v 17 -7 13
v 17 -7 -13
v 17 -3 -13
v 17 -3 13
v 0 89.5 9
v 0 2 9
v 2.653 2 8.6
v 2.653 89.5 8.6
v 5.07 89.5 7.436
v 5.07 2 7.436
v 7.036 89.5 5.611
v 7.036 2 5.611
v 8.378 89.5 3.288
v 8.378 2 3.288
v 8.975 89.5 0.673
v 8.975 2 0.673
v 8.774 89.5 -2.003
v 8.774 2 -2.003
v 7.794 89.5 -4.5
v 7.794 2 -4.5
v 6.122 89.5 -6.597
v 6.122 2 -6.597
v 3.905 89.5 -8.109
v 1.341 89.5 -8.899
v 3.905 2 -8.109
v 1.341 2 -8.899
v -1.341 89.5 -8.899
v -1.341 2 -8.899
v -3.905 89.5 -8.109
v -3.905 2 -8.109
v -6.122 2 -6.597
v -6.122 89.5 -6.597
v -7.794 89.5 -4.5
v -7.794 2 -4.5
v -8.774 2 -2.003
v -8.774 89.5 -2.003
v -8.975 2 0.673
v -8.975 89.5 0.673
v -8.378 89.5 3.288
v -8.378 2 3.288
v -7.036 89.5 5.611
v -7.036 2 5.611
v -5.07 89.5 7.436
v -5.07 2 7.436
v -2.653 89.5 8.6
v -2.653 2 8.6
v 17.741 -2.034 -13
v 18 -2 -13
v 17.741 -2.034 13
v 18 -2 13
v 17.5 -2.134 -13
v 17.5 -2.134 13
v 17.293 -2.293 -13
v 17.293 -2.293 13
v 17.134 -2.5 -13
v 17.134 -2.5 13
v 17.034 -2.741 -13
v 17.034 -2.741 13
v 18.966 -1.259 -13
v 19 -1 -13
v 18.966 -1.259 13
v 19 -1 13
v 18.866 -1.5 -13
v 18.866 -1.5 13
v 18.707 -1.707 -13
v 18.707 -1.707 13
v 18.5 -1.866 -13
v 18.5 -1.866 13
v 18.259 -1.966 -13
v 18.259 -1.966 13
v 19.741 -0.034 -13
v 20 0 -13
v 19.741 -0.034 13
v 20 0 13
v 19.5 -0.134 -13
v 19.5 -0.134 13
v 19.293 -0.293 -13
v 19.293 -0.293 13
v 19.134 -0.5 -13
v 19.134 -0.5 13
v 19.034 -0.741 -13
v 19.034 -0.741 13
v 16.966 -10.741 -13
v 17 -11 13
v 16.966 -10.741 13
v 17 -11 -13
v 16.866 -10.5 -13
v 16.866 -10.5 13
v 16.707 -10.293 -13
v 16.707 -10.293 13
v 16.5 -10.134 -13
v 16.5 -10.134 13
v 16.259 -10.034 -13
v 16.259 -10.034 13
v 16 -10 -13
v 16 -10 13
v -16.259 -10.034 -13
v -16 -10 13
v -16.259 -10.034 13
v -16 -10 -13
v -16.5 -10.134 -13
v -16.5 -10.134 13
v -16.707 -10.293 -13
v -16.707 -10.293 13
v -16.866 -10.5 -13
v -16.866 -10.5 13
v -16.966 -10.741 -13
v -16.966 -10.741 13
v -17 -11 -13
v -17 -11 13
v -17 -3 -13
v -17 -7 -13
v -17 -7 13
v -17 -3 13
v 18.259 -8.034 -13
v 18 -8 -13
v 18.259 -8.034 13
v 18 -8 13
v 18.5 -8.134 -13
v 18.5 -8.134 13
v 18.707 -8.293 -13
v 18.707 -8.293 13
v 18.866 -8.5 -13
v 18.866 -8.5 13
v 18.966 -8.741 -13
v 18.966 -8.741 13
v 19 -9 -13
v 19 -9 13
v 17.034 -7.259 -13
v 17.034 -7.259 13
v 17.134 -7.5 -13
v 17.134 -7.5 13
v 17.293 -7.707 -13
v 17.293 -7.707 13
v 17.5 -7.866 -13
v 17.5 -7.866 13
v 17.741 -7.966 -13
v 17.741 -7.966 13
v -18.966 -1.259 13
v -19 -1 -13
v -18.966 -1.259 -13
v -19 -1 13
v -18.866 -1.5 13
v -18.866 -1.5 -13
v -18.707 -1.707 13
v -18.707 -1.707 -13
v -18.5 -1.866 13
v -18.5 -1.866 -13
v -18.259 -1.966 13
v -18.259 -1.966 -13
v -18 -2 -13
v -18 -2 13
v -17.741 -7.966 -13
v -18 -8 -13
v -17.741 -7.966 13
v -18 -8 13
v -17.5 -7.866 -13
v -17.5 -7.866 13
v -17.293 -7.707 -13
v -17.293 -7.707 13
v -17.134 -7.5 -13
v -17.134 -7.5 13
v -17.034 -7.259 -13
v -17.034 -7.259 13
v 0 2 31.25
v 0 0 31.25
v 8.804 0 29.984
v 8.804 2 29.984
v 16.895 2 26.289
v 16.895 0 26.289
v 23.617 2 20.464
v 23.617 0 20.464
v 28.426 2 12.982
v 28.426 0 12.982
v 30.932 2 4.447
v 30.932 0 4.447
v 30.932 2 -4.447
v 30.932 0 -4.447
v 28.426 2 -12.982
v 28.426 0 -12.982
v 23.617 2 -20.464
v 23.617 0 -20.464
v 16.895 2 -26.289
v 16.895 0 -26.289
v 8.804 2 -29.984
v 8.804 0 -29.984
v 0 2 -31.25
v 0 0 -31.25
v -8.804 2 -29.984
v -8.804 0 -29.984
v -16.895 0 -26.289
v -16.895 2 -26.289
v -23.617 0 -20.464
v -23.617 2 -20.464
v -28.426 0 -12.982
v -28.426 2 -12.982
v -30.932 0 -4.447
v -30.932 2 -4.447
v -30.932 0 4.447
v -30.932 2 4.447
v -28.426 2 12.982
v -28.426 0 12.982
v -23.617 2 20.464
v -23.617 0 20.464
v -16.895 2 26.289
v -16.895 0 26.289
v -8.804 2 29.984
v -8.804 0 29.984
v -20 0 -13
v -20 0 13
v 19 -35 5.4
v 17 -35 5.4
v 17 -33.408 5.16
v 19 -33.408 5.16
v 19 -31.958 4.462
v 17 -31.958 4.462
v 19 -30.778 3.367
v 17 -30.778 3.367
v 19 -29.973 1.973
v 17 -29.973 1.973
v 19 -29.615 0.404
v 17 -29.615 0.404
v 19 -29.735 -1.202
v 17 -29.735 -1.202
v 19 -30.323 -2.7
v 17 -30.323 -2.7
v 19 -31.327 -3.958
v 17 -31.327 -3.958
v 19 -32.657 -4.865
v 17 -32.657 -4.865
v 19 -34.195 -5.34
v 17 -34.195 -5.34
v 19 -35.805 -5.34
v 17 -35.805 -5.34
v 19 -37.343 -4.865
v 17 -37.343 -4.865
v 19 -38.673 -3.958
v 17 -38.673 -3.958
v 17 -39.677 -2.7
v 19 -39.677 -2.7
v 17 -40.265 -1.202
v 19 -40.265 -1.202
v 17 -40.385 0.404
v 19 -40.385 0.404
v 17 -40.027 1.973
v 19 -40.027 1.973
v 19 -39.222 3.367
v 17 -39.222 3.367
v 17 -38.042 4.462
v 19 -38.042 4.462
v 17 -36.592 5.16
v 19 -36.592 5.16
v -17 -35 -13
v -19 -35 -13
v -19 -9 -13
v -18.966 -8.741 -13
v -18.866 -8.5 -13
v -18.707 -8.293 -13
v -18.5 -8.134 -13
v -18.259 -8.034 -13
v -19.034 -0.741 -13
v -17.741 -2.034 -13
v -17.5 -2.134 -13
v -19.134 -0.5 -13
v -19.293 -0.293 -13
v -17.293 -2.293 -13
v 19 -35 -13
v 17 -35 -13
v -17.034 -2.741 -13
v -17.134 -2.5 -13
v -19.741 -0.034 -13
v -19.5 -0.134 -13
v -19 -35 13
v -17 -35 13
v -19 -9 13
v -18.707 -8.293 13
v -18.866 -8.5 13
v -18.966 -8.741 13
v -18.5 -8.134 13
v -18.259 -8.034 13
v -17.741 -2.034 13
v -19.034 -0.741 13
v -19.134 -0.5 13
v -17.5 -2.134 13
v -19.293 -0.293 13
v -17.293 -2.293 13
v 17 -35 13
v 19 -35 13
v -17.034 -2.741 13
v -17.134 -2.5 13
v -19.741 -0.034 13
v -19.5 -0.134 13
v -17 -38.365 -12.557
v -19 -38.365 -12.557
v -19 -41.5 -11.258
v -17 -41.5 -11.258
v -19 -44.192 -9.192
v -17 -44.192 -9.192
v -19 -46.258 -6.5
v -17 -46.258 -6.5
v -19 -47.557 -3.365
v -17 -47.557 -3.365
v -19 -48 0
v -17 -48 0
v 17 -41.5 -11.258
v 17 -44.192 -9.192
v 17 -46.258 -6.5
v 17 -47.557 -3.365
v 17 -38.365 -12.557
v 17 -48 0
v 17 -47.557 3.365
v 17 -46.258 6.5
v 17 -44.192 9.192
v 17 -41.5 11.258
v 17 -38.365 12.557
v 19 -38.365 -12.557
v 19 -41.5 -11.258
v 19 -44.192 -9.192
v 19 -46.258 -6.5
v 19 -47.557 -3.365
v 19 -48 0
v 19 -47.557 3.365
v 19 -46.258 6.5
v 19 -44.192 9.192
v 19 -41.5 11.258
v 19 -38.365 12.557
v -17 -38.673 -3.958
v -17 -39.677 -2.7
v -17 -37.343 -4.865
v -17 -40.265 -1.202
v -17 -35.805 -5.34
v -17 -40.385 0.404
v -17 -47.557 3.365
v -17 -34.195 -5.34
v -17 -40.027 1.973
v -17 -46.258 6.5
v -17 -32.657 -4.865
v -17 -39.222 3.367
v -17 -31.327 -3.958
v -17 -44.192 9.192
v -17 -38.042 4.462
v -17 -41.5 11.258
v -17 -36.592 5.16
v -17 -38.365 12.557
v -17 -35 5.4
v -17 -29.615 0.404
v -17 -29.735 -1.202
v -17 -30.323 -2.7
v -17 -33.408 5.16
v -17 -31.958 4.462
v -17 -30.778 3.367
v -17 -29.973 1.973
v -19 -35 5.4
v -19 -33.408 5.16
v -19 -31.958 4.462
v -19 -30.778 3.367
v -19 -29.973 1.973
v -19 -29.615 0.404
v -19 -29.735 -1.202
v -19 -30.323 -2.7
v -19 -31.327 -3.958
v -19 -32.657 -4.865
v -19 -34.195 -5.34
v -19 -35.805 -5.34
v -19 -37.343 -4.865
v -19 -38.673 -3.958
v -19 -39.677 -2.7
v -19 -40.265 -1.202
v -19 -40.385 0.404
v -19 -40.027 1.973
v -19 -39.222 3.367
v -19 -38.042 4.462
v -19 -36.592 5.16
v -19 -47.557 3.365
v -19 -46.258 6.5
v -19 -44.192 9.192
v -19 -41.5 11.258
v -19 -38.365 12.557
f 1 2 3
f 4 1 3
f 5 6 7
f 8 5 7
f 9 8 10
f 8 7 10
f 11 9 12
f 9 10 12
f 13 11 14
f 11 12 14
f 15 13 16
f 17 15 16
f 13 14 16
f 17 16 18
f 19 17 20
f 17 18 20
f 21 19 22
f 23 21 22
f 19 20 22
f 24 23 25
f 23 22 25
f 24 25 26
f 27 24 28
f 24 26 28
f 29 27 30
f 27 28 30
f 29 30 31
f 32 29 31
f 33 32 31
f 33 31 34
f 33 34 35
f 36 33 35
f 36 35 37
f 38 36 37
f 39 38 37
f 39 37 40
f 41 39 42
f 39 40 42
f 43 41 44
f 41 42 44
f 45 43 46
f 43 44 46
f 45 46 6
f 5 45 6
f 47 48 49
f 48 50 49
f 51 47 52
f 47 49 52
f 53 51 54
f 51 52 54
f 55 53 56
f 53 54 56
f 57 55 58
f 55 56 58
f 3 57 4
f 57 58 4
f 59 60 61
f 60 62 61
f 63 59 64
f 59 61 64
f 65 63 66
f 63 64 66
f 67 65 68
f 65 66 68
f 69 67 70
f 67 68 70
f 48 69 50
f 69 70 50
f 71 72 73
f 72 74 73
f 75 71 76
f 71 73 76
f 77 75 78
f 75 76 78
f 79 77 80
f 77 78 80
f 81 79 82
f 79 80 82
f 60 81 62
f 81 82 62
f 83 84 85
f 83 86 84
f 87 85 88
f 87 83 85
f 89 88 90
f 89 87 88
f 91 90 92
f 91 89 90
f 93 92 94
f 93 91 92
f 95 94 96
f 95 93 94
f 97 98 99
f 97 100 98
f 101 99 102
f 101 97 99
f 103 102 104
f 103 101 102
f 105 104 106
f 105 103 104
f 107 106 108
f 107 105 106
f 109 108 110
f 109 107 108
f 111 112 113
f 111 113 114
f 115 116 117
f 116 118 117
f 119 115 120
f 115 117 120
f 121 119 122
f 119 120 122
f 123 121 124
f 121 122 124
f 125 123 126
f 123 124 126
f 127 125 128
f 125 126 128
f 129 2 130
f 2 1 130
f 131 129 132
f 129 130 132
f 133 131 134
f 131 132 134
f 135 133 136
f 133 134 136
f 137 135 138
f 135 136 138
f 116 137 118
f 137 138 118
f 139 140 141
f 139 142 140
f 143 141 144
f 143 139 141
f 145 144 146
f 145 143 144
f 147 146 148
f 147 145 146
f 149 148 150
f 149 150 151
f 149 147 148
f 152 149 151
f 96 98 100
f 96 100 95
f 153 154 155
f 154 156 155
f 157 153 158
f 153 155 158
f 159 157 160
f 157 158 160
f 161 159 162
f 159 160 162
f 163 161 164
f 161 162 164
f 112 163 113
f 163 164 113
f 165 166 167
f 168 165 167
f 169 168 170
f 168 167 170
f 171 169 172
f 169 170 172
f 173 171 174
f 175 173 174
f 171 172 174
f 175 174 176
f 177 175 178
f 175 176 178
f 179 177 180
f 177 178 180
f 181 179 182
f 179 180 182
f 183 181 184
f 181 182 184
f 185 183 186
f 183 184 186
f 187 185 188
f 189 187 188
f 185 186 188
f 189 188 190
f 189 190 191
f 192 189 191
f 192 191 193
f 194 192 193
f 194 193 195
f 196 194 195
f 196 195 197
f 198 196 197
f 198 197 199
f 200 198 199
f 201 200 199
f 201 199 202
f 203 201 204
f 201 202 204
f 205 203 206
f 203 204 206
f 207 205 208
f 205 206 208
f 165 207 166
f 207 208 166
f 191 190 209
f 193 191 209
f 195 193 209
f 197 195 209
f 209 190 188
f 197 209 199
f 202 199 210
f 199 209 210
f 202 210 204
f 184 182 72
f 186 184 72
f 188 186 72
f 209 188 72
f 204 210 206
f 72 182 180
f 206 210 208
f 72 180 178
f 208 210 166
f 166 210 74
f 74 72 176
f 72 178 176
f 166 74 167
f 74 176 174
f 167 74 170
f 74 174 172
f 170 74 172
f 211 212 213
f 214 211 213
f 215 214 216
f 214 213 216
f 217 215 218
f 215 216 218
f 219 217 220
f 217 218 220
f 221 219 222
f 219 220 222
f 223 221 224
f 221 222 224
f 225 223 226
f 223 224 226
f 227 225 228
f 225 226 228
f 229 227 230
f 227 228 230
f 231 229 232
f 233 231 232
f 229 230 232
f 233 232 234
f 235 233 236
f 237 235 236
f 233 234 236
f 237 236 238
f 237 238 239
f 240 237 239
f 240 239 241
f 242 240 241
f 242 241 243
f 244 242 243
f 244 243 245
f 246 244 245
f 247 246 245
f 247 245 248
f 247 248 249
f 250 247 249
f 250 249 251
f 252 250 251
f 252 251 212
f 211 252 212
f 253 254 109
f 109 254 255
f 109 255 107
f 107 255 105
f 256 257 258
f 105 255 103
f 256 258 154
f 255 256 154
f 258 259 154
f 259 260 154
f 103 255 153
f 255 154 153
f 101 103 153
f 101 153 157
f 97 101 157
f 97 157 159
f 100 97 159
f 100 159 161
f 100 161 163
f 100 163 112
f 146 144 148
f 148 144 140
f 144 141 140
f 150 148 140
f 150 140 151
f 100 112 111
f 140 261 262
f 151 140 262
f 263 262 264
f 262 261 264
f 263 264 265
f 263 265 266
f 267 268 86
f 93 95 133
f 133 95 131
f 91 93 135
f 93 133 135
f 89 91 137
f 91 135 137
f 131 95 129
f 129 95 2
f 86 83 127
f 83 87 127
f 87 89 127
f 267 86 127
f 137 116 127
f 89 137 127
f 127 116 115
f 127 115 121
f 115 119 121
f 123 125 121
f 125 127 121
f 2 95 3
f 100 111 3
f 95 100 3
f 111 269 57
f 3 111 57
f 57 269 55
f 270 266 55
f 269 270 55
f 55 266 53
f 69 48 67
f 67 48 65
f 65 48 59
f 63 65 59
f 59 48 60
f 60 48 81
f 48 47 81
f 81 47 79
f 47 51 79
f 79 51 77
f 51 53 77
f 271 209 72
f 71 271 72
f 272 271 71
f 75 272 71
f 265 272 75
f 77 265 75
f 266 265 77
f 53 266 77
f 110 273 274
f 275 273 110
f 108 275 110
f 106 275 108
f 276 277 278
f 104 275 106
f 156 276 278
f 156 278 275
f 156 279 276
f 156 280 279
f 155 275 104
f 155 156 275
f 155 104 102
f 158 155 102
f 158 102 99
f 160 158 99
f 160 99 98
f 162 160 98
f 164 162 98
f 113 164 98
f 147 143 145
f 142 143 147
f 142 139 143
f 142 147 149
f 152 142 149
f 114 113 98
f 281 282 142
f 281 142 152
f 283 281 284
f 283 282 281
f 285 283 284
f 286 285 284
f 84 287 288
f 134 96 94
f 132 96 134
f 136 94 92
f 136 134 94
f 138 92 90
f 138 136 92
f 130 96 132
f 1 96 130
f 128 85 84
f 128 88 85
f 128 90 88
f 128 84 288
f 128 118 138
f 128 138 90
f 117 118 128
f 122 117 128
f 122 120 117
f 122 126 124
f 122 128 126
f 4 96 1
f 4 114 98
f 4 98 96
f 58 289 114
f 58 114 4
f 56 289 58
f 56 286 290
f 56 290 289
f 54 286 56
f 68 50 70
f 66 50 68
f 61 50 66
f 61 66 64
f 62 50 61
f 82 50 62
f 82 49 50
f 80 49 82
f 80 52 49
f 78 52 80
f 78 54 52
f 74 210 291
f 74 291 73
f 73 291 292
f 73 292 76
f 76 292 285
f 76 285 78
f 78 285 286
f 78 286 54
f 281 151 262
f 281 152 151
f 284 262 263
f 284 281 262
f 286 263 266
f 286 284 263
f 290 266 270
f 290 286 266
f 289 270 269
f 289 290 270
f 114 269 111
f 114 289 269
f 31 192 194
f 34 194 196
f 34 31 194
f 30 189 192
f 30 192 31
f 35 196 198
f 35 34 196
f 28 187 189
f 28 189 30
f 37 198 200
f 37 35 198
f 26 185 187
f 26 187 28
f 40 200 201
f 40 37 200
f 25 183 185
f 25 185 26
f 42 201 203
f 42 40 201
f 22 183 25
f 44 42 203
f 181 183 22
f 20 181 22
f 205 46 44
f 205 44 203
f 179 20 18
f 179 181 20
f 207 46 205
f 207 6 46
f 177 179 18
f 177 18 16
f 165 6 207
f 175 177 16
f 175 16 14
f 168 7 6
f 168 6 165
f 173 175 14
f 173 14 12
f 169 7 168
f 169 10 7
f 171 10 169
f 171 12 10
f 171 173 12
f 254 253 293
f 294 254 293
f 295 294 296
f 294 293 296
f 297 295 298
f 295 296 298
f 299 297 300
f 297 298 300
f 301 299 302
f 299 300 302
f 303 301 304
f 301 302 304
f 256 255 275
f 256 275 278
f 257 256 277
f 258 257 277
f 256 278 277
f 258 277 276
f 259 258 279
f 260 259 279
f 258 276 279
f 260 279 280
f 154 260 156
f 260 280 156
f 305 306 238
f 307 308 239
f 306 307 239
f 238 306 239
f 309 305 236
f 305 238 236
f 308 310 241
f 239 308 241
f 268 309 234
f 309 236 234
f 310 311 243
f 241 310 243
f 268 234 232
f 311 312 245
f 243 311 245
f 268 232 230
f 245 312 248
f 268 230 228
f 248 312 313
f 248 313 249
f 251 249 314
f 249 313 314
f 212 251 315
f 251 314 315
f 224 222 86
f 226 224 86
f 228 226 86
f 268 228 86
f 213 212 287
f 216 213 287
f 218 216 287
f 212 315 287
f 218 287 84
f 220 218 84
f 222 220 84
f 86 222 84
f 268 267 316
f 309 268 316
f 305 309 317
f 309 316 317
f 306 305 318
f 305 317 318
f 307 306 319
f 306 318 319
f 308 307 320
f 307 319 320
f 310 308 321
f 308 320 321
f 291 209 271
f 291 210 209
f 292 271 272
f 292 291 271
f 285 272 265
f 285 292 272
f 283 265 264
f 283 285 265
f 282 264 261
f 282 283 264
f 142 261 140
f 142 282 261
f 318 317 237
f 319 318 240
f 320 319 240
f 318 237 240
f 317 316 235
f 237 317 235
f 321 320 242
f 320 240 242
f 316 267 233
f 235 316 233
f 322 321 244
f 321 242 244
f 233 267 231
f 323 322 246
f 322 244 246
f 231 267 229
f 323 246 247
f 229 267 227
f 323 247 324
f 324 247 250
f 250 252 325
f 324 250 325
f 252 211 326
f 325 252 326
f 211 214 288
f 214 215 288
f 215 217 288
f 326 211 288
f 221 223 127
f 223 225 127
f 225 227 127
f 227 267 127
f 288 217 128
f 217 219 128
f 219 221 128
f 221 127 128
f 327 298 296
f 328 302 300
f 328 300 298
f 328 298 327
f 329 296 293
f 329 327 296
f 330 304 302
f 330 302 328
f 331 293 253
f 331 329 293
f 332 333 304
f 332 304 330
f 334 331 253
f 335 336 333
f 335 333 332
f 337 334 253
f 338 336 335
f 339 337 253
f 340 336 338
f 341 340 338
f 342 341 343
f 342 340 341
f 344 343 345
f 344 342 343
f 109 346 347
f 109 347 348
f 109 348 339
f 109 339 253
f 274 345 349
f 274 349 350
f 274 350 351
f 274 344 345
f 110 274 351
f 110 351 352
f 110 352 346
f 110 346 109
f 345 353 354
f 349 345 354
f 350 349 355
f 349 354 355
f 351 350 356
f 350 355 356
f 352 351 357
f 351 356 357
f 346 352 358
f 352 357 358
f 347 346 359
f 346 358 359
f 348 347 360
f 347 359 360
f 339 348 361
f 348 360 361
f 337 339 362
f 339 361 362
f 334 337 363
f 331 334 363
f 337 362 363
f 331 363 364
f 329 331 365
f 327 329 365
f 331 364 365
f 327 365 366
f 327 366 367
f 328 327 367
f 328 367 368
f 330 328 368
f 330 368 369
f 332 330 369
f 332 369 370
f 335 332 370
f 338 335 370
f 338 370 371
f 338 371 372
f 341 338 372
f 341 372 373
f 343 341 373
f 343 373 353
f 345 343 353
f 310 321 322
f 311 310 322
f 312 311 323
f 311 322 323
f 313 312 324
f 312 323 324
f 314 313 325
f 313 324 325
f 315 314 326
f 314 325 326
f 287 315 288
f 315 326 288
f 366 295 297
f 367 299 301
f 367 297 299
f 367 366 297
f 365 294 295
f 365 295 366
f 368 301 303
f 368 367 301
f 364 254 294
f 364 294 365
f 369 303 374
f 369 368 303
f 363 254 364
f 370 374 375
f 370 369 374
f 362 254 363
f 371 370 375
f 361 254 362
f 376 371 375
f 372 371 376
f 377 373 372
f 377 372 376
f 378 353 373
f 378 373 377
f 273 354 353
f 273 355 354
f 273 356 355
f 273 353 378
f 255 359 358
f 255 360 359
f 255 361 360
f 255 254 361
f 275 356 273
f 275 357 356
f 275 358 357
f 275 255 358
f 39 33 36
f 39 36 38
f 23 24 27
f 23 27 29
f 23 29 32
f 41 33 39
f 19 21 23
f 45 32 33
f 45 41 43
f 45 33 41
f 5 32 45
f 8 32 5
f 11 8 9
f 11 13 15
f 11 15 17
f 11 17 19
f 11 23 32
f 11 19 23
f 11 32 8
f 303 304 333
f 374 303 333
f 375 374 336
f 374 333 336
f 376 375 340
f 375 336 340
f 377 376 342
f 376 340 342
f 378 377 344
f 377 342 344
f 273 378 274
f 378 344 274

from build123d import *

# Parameters (mm, degrees)
SKETCH1_R               = 31.25
BOSS_EXTRUDE1_DEPTH     = 2
SKETCH2_W               = 38
SKETCH2_H               = 26
BOSS_EXTRUDE2_DEPTH     = 48
SKETCH3_W               = 34
SKETCH3_H               = 38
CUT_EXTRUDE1_DEPTH      = 48
CUT_EXTRUDE2_DEPTH      = 48
M12X1_25_TAPPED_HOLE1_D = 10.8
SKETCH7_W               = 2
SKETCH7_H               = 6
CUT_EXTRUDE3_DEPTH      = 48
FILLET2_R               = 1
SKETCH8_R               = 9
BOSS_EXTRUDE3_DEPTH     = 87.5


with BuildPart() as part:
    # Sketch1 → Boss-Extrude1 (new body)
    with BuildSketch(Plane(origin=(0, 0, 0), x_dir=(1, 0, 0), z_dir=(0, 1, 0))):
        with Locations(Location((0, 0, 0), (0, 0, 270))):
            Circle(SKETCH1_R)
    extrude(amount=BOSS_EXTRUDE1_DEPTH)

    # Sketch2 → Boss-Extrude2 (add)
    with BuildSketch(Plane.XZ):
        Rectangle(SKETCH2_W, SKETCH2_H)
    extrude(amount=BOSS_EXTRUDE2_DEPTH)

    # Sketch3 → Cut-Extrude1 (cut)
    with BuildSketch(Plane.XY.offset(13)):
        with Locations((0, -29)):
            Rectangle(SKETCH3_W, SKETCH3_H)
    extrude(amount=-CUT_EXTRUDE1_DEPTH, mode=Mode.SUBTRACT)

    # Sketch4 → Cut-Extrude2 (cut)
    with BuildSketch(Plane(origin=(19, 0, 0), x_dir=(0, 0, -1), z_dir=(1, 0, 0))):
        with BuildLine():
            ThreePointArc((0, -48), (-9.192388155, -44.192388155), (-13, -35))
            Line((-13, -35), (-13, -48))
            Line((-13, -48), (0, -48))
        make_face()
        with BuildLine():
            Line((13, -48), (13, -35))
            ThreePointArc((13, -35), (9.192388155, -44.192388155), (0, -48))
            Line((0, -48), (13, -48))
        make_face()
    extrude(amount=-CUT_EXTRUDE2_DEPTH, mode=Mode.SUBTRACT)

    # M12x1.25 Tapped Hole1 (through all)
    with Locations(Plane(origin=(19, 0, 0), x_dir=(0, 0, -1), z_dir=(1, 0, 0))):
        with Locations((0, -35)):
            Hole(M12X1_25_TAPPED_HOLE1_D / 2)

    # Sketch7 → Cut-Extrude3 (cut)
    with BuildSketch(Plane(origin=(0, 0, -13), x_dir=(-1, 0, 0), z_dir=(0, 0, -1))):
        with Locations((-18, -5)):
            Rectangle(SKETCH7_W, SKETCH7_H)
        with Locations((18, -5)):
            Rectangle(SKETCH7_W, SKETCH7_H)
    extrude(amount=-CUT_EXTRUDE3_DEPTH, mode=Mode.SUBTRACT)

    # Fillet2
    fillet2_edges = [part.edges().sort_by_distance(p)[0] for p in [
        (17, -10, 0),
        (-17, -10, 0),
        (19, -8, 0),
        (17, -8, 0),
        (17, -2, 0),
        (19, -2, 0),
        (19, 0, 0),
        (-19, 0, 0),
        (-19, -2, 0),
        (-17, -2, 0),
        (-17, -8, 0),
        (-19, -8, 0),
    ]]
    fillet(fillet2_edges, radius=FILLET2_R - 0.0001)  # a hair under: the kernel refuses the full size

    # Sketch8 → Boss-Extrude3 (add)
    with BuildSketch(Plane(origin=(0, 2, 0), x_dir=(1, 0, 0), z_dir=(0, 1, 0))):
        with Locations(Location((0, 0, 0), (0, 0, 270))):
            Circle(SKETCH8_R)
    extrude(amount=BOSS_EXTRUDE3_DEPTH)


solid = part.part
